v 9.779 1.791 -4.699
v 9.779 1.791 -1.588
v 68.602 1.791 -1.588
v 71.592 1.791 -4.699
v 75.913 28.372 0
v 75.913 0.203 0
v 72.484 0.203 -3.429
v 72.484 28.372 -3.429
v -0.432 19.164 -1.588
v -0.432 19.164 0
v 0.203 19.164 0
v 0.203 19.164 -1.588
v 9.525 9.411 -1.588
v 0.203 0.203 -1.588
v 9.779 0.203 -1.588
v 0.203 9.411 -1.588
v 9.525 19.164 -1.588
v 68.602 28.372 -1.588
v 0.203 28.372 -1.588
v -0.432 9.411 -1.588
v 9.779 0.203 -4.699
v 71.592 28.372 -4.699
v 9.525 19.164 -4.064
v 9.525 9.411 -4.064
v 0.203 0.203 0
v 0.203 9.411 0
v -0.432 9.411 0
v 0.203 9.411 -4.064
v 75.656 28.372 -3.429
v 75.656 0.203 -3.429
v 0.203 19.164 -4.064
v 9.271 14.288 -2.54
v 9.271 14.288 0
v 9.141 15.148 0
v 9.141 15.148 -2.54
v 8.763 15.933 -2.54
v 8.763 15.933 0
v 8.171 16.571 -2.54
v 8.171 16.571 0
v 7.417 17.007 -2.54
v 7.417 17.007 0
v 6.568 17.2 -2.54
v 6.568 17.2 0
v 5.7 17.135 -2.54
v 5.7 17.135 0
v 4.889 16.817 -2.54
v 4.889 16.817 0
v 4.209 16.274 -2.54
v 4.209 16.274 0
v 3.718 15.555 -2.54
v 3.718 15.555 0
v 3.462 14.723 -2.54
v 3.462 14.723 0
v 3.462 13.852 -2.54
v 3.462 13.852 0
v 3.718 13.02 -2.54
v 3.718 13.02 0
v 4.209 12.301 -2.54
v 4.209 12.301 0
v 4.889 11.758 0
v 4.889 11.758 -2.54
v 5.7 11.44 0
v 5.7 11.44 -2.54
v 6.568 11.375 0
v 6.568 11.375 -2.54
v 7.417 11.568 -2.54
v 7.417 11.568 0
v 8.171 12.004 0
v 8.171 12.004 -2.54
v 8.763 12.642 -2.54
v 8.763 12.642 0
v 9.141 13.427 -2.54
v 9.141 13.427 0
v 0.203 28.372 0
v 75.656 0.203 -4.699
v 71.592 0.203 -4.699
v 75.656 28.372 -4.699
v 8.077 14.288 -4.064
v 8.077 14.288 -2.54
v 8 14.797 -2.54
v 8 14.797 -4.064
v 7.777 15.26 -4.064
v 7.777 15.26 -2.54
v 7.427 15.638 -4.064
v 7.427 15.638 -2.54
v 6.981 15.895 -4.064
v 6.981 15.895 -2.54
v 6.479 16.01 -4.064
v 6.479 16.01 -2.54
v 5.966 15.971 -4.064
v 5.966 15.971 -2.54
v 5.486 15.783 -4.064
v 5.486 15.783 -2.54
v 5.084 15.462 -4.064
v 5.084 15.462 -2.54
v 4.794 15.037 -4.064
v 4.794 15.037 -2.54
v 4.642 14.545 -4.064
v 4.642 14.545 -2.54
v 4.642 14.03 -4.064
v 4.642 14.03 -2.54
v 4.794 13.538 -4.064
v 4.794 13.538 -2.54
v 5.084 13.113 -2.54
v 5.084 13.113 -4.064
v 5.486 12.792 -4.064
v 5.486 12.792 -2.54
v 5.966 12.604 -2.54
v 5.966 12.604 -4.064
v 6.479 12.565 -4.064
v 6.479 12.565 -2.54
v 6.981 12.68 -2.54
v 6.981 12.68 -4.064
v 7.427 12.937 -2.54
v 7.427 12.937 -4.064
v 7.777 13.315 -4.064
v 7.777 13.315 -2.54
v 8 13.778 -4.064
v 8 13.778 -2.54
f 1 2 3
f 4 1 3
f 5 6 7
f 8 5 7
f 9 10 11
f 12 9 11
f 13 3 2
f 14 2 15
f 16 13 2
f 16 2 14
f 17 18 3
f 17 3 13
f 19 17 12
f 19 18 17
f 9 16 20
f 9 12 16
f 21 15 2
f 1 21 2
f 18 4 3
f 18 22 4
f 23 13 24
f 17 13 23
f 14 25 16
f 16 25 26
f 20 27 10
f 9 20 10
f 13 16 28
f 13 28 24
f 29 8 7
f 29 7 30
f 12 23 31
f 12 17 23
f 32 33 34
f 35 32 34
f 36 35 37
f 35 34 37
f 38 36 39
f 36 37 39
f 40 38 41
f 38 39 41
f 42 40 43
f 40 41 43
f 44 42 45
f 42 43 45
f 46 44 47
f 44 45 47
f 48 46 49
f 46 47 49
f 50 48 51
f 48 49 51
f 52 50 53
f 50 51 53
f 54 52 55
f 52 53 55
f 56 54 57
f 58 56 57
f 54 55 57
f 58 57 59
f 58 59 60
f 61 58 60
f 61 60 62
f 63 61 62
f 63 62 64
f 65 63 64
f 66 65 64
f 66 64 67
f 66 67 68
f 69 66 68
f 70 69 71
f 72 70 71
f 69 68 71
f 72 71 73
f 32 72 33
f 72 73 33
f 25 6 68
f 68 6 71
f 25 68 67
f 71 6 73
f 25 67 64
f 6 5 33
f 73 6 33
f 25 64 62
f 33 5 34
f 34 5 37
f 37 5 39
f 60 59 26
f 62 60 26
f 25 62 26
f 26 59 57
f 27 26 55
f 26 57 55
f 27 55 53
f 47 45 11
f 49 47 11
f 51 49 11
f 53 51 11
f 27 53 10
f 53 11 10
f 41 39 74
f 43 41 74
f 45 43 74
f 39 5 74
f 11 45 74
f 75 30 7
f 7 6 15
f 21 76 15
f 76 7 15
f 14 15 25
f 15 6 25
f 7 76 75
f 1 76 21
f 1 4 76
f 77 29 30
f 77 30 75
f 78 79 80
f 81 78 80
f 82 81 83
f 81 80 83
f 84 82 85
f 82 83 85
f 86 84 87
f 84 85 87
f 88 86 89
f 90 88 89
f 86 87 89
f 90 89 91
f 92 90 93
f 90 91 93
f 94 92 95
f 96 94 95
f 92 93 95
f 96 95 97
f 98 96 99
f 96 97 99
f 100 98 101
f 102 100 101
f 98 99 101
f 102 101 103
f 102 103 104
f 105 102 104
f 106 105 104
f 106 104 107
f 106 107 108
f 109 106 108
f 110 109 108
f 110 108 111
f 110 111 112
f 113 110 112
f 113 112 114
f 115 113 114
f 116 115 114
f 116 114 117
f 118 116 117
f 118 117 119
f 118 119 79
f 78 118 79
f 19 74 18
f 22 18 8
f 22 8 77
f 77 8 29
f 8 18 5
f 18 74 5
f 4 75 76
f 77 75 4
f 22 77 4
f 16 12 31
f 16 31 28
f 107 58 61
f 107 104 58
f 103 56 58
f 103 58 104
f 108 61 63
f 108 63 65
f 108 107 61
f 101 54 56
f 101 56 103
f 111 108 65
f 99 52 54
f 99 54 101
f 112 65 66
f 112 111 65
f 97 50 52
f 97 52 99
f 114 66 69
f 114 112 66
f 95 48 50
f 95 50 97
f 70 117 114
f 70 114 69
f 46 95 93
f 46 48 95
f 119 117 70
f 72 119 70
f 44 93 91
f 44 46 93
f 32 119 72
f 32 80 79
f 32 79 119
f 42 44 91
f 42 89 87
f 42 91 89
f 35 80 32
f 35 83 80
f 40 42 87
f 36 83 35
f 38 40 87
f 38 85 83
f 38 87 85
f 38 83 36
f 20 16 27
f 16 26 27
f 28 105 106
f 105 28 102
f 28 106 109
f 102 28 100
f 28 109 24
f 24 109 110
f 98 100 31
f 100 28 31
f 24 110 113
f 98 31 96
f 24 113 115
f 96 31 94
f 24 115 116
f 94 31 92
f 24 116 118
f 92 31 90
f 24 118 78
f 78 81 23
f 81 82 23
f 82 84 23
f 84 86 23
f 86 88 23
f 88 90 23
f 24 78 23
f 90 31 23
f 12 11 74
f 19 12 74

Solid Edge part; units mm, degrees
sketch "Sketch1" plane through (0, 0, 0) normal (0, 0, 1) x (1, 0, 0)
  line L0 (75.9968, 0.2032) -> (0.2032, 0.2032)
  line L1 (0.2032, 0.2032) -> (0.2032, 9.4107)
  line L2 (0.2032, 9.4107) -> (-0.4318, 9.4107)
  line L3 (-0.4318, 9.4107) -> (-0.4318, 19.1643)
  line L4 (-0.4318, 19.1643) -> (0.2032, 19.1643)
  line L5 (0.2032, 19.1643) -> (0.2032, 28.3718)
  line L6 (0.2032, 28.3718) -> (75.9968, 28.3718)
  line L7 (75.9968, 28.3718) -> (75.9968, 0.2032)
extrude "Protrusion1" add sketch "Sketch1" against normal up to vertex (1.5875 mm away)
sketch "Sketch2" plane through (38.1, 28.3718, -0.7937) normal (0, 1, 0) x (1, 0, 0)
  line L0 (34.6376, 2.3812) -> (38.862, -1.8431)
  line L1 (38.862, -1.8431) -> (38.862, 2.3812)
  line L2 (38.862, 2.3812) -> (34.6376, 2.3812)
extrude "Cutout1" cut sketch "Sketch2" against normal up to next
sketch "Sketch3" plane through (36.9467, 14.2875, -1.5875) normal (0, 0, -1) x (1, 0, 0)
  line L0 (-27.4217, -4.8768) -> (-36.7435, -4.8768)
  line L1 (-36.7435, -4.8768) -> (-36.7435, 4.8768)
  line L2 (-36.7435, 4.8768) -> (-27.4217, 4.8768)
  line L3 (-27.4217, 4.8768) -> (-27.4217, -4.8768)
extrude "Protrusion2" add sketch "Sketch3" along normal up to vertex (2.4765 mm away)
sketch "Sketch4" plane through (37.7404, 14.2875, 0) normal (0, 0, 1) x (1, 0, 0)
  circle A0 centre (-31.3904, 0) radius 1.7272
extrude "Cutout2" cut sketch "Sketch4" against normal through all
sketch "Sketch5" plane through (37.7404, 14.2875, 0) normal (0, 0, 1) x (1, 0, 0)
  circle A0 centre (-31.3904, 0) radius 2.921
extrude "Cutout3" cut sketch "Sketch5" against normal blind 2.54
sketch "Sketch6" plane through (38.0579, 28.3718, -0.7937) normal (0, 1, 0) x (1, 0, 0)
  line L0 (33.5337, 3.9052) -> (30.5442, 0.7937)
  line L1 (30.5442, 0.7937) -> (30.5442, -0.7937)
  line L2 (30.5442, -0.7937) -> (37.8547, -0.7937)
  line L3 (37.8547, -0.7937) -> (34.4257, 2.6352)
  line L4 (34.4257, 2.6352) -> (37.5977, 2.6352)
  line L5 (37.5977, 2.6352) -> (37.5977, 3.9052)
  line L6 (37.5977, 3.9052) -> (33.5337, 3.9052)
extrude "Protrusion3" add sketch "Sketch6" against normal up to vertex (28.1686 mm away)
sketch "Sketch7" plane through (34.4027, 14.2875, -1.5875) normal (0, 0, -1) x (1, 0, 0)
  line L0 (-24.6237, 12.4968) -> (37.1889, 12.4968)
  line L1 (37.1889, 12.4968) -> (37.1889, 14.0843)
  line L2 (37.1889, 14.0843) -> (-24.6237, 14.0843)
  line L3 (-24.6237, 14.0843) -> (-24.6237, 12.4968)
extrude "Protrusion4" add sketch "Sketch7" along normal up to vertex (3.1115 mm away)
